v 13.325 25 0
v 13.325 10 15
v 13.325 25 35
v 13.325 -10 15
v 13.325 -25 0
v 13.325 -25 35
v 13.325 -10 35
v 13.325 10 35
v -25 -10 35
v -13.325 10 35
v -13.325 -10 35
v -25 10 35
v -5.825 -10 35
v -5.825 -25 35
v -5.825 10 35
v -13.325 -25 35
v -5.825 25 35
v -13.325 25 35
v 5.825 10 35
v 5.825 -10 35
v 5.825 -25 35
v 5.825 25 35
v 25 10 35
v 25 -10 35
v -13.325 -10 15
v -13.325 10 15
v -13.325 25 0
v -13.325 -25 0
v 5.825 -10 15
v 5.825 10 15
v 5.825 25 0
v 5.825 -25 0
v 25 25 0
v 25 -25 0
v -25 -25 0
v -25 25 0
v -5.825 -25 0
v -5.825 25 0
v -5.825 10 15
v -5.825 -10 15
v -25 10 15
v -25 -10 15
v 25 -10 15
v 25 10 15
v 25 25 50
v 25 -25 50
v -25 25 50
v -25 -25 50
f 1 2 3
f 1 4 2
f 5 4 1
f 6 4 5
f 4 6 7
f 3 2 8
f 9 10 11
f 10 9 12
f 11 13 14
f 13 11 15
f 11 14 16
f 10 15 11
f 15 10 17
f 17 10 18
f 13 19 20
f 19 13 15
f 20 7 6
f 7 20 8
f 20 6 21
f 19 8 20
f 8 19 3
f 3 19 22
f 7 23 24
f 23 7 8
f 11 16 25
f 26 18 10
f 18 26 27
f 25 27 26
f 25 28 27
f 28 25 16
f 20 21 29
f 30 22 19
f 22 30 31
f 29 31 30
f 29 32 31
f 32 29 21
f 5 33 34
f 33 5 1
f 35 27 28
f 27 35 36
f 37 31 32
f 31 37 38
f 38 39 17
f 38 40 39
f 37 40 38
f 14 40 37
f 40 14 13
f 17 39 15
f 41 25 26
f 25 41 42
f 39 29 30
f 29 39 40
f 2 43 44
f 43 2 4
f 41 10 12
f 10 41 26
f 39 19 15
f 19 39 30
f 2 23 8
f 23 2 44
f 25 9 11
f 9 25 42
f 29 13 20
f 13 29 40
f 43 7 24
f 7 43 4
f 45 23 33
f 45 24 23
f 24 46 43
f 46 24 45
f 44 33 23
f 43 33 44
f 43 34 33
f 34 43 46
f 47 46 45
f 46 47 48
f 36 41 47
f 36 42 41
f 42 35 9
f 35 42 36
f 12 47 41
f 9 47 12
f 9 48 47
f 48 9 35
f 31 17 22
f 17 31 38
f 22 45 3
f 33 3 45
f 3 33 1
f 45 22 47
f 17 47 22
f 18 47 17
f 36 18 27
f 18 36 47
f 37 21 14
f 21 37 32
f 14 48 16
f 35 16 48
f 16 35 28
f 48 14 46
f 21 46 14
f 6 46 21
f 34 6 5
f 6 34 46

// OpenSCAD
M_Slit_Width = 150; //[0:300]
M_Slit_Height = 70; //[0:100]
O_Width = 40; //[0:100]
O_Height = 40; //[0:100]
//width in centimeters
size = 5;
Clip_O_To_Match_M_Slits = 0; //[1:yes,0:no]
Upside_Down = 0; //[1:yes,0:no]

if(Upside_Down==0)
{
	scale(size*10) object();
}
else
{
	scale(size*10) translate([0,0,1]) scale([1,1,-1]) object();
}


module object()
{
difference()
{
	translate([0,0,0.5]) cube(size=1, center=true);
	union()
	{
		difference()
		{
			translate([0,0,(mSepH/2)-0.1]) cube(size=[0.333+(4*mSepW/3),2,mSepH+0.2], center=true);
			translate([0,0,0.5]) cube(size=[0.333-(2*mSepW/3),2,1], center=true);
		}
		difference()
		{
			translate([0,0,0.5]) cube(size=[2,ow,oh], center=true);
			if(co==1)
			{
				translate([-0.5,-0.5,mSepH]) cube(size=[1,1,1-mSepH]);
			}
		}
	}
}
}

mSepW = M_Slit_Width/1000;
mSepH = M_Slit_Height/100;
ow = O_Width/100;
oh = O_Height/100;
co = Clip_O_To_Match_M_Slits;
